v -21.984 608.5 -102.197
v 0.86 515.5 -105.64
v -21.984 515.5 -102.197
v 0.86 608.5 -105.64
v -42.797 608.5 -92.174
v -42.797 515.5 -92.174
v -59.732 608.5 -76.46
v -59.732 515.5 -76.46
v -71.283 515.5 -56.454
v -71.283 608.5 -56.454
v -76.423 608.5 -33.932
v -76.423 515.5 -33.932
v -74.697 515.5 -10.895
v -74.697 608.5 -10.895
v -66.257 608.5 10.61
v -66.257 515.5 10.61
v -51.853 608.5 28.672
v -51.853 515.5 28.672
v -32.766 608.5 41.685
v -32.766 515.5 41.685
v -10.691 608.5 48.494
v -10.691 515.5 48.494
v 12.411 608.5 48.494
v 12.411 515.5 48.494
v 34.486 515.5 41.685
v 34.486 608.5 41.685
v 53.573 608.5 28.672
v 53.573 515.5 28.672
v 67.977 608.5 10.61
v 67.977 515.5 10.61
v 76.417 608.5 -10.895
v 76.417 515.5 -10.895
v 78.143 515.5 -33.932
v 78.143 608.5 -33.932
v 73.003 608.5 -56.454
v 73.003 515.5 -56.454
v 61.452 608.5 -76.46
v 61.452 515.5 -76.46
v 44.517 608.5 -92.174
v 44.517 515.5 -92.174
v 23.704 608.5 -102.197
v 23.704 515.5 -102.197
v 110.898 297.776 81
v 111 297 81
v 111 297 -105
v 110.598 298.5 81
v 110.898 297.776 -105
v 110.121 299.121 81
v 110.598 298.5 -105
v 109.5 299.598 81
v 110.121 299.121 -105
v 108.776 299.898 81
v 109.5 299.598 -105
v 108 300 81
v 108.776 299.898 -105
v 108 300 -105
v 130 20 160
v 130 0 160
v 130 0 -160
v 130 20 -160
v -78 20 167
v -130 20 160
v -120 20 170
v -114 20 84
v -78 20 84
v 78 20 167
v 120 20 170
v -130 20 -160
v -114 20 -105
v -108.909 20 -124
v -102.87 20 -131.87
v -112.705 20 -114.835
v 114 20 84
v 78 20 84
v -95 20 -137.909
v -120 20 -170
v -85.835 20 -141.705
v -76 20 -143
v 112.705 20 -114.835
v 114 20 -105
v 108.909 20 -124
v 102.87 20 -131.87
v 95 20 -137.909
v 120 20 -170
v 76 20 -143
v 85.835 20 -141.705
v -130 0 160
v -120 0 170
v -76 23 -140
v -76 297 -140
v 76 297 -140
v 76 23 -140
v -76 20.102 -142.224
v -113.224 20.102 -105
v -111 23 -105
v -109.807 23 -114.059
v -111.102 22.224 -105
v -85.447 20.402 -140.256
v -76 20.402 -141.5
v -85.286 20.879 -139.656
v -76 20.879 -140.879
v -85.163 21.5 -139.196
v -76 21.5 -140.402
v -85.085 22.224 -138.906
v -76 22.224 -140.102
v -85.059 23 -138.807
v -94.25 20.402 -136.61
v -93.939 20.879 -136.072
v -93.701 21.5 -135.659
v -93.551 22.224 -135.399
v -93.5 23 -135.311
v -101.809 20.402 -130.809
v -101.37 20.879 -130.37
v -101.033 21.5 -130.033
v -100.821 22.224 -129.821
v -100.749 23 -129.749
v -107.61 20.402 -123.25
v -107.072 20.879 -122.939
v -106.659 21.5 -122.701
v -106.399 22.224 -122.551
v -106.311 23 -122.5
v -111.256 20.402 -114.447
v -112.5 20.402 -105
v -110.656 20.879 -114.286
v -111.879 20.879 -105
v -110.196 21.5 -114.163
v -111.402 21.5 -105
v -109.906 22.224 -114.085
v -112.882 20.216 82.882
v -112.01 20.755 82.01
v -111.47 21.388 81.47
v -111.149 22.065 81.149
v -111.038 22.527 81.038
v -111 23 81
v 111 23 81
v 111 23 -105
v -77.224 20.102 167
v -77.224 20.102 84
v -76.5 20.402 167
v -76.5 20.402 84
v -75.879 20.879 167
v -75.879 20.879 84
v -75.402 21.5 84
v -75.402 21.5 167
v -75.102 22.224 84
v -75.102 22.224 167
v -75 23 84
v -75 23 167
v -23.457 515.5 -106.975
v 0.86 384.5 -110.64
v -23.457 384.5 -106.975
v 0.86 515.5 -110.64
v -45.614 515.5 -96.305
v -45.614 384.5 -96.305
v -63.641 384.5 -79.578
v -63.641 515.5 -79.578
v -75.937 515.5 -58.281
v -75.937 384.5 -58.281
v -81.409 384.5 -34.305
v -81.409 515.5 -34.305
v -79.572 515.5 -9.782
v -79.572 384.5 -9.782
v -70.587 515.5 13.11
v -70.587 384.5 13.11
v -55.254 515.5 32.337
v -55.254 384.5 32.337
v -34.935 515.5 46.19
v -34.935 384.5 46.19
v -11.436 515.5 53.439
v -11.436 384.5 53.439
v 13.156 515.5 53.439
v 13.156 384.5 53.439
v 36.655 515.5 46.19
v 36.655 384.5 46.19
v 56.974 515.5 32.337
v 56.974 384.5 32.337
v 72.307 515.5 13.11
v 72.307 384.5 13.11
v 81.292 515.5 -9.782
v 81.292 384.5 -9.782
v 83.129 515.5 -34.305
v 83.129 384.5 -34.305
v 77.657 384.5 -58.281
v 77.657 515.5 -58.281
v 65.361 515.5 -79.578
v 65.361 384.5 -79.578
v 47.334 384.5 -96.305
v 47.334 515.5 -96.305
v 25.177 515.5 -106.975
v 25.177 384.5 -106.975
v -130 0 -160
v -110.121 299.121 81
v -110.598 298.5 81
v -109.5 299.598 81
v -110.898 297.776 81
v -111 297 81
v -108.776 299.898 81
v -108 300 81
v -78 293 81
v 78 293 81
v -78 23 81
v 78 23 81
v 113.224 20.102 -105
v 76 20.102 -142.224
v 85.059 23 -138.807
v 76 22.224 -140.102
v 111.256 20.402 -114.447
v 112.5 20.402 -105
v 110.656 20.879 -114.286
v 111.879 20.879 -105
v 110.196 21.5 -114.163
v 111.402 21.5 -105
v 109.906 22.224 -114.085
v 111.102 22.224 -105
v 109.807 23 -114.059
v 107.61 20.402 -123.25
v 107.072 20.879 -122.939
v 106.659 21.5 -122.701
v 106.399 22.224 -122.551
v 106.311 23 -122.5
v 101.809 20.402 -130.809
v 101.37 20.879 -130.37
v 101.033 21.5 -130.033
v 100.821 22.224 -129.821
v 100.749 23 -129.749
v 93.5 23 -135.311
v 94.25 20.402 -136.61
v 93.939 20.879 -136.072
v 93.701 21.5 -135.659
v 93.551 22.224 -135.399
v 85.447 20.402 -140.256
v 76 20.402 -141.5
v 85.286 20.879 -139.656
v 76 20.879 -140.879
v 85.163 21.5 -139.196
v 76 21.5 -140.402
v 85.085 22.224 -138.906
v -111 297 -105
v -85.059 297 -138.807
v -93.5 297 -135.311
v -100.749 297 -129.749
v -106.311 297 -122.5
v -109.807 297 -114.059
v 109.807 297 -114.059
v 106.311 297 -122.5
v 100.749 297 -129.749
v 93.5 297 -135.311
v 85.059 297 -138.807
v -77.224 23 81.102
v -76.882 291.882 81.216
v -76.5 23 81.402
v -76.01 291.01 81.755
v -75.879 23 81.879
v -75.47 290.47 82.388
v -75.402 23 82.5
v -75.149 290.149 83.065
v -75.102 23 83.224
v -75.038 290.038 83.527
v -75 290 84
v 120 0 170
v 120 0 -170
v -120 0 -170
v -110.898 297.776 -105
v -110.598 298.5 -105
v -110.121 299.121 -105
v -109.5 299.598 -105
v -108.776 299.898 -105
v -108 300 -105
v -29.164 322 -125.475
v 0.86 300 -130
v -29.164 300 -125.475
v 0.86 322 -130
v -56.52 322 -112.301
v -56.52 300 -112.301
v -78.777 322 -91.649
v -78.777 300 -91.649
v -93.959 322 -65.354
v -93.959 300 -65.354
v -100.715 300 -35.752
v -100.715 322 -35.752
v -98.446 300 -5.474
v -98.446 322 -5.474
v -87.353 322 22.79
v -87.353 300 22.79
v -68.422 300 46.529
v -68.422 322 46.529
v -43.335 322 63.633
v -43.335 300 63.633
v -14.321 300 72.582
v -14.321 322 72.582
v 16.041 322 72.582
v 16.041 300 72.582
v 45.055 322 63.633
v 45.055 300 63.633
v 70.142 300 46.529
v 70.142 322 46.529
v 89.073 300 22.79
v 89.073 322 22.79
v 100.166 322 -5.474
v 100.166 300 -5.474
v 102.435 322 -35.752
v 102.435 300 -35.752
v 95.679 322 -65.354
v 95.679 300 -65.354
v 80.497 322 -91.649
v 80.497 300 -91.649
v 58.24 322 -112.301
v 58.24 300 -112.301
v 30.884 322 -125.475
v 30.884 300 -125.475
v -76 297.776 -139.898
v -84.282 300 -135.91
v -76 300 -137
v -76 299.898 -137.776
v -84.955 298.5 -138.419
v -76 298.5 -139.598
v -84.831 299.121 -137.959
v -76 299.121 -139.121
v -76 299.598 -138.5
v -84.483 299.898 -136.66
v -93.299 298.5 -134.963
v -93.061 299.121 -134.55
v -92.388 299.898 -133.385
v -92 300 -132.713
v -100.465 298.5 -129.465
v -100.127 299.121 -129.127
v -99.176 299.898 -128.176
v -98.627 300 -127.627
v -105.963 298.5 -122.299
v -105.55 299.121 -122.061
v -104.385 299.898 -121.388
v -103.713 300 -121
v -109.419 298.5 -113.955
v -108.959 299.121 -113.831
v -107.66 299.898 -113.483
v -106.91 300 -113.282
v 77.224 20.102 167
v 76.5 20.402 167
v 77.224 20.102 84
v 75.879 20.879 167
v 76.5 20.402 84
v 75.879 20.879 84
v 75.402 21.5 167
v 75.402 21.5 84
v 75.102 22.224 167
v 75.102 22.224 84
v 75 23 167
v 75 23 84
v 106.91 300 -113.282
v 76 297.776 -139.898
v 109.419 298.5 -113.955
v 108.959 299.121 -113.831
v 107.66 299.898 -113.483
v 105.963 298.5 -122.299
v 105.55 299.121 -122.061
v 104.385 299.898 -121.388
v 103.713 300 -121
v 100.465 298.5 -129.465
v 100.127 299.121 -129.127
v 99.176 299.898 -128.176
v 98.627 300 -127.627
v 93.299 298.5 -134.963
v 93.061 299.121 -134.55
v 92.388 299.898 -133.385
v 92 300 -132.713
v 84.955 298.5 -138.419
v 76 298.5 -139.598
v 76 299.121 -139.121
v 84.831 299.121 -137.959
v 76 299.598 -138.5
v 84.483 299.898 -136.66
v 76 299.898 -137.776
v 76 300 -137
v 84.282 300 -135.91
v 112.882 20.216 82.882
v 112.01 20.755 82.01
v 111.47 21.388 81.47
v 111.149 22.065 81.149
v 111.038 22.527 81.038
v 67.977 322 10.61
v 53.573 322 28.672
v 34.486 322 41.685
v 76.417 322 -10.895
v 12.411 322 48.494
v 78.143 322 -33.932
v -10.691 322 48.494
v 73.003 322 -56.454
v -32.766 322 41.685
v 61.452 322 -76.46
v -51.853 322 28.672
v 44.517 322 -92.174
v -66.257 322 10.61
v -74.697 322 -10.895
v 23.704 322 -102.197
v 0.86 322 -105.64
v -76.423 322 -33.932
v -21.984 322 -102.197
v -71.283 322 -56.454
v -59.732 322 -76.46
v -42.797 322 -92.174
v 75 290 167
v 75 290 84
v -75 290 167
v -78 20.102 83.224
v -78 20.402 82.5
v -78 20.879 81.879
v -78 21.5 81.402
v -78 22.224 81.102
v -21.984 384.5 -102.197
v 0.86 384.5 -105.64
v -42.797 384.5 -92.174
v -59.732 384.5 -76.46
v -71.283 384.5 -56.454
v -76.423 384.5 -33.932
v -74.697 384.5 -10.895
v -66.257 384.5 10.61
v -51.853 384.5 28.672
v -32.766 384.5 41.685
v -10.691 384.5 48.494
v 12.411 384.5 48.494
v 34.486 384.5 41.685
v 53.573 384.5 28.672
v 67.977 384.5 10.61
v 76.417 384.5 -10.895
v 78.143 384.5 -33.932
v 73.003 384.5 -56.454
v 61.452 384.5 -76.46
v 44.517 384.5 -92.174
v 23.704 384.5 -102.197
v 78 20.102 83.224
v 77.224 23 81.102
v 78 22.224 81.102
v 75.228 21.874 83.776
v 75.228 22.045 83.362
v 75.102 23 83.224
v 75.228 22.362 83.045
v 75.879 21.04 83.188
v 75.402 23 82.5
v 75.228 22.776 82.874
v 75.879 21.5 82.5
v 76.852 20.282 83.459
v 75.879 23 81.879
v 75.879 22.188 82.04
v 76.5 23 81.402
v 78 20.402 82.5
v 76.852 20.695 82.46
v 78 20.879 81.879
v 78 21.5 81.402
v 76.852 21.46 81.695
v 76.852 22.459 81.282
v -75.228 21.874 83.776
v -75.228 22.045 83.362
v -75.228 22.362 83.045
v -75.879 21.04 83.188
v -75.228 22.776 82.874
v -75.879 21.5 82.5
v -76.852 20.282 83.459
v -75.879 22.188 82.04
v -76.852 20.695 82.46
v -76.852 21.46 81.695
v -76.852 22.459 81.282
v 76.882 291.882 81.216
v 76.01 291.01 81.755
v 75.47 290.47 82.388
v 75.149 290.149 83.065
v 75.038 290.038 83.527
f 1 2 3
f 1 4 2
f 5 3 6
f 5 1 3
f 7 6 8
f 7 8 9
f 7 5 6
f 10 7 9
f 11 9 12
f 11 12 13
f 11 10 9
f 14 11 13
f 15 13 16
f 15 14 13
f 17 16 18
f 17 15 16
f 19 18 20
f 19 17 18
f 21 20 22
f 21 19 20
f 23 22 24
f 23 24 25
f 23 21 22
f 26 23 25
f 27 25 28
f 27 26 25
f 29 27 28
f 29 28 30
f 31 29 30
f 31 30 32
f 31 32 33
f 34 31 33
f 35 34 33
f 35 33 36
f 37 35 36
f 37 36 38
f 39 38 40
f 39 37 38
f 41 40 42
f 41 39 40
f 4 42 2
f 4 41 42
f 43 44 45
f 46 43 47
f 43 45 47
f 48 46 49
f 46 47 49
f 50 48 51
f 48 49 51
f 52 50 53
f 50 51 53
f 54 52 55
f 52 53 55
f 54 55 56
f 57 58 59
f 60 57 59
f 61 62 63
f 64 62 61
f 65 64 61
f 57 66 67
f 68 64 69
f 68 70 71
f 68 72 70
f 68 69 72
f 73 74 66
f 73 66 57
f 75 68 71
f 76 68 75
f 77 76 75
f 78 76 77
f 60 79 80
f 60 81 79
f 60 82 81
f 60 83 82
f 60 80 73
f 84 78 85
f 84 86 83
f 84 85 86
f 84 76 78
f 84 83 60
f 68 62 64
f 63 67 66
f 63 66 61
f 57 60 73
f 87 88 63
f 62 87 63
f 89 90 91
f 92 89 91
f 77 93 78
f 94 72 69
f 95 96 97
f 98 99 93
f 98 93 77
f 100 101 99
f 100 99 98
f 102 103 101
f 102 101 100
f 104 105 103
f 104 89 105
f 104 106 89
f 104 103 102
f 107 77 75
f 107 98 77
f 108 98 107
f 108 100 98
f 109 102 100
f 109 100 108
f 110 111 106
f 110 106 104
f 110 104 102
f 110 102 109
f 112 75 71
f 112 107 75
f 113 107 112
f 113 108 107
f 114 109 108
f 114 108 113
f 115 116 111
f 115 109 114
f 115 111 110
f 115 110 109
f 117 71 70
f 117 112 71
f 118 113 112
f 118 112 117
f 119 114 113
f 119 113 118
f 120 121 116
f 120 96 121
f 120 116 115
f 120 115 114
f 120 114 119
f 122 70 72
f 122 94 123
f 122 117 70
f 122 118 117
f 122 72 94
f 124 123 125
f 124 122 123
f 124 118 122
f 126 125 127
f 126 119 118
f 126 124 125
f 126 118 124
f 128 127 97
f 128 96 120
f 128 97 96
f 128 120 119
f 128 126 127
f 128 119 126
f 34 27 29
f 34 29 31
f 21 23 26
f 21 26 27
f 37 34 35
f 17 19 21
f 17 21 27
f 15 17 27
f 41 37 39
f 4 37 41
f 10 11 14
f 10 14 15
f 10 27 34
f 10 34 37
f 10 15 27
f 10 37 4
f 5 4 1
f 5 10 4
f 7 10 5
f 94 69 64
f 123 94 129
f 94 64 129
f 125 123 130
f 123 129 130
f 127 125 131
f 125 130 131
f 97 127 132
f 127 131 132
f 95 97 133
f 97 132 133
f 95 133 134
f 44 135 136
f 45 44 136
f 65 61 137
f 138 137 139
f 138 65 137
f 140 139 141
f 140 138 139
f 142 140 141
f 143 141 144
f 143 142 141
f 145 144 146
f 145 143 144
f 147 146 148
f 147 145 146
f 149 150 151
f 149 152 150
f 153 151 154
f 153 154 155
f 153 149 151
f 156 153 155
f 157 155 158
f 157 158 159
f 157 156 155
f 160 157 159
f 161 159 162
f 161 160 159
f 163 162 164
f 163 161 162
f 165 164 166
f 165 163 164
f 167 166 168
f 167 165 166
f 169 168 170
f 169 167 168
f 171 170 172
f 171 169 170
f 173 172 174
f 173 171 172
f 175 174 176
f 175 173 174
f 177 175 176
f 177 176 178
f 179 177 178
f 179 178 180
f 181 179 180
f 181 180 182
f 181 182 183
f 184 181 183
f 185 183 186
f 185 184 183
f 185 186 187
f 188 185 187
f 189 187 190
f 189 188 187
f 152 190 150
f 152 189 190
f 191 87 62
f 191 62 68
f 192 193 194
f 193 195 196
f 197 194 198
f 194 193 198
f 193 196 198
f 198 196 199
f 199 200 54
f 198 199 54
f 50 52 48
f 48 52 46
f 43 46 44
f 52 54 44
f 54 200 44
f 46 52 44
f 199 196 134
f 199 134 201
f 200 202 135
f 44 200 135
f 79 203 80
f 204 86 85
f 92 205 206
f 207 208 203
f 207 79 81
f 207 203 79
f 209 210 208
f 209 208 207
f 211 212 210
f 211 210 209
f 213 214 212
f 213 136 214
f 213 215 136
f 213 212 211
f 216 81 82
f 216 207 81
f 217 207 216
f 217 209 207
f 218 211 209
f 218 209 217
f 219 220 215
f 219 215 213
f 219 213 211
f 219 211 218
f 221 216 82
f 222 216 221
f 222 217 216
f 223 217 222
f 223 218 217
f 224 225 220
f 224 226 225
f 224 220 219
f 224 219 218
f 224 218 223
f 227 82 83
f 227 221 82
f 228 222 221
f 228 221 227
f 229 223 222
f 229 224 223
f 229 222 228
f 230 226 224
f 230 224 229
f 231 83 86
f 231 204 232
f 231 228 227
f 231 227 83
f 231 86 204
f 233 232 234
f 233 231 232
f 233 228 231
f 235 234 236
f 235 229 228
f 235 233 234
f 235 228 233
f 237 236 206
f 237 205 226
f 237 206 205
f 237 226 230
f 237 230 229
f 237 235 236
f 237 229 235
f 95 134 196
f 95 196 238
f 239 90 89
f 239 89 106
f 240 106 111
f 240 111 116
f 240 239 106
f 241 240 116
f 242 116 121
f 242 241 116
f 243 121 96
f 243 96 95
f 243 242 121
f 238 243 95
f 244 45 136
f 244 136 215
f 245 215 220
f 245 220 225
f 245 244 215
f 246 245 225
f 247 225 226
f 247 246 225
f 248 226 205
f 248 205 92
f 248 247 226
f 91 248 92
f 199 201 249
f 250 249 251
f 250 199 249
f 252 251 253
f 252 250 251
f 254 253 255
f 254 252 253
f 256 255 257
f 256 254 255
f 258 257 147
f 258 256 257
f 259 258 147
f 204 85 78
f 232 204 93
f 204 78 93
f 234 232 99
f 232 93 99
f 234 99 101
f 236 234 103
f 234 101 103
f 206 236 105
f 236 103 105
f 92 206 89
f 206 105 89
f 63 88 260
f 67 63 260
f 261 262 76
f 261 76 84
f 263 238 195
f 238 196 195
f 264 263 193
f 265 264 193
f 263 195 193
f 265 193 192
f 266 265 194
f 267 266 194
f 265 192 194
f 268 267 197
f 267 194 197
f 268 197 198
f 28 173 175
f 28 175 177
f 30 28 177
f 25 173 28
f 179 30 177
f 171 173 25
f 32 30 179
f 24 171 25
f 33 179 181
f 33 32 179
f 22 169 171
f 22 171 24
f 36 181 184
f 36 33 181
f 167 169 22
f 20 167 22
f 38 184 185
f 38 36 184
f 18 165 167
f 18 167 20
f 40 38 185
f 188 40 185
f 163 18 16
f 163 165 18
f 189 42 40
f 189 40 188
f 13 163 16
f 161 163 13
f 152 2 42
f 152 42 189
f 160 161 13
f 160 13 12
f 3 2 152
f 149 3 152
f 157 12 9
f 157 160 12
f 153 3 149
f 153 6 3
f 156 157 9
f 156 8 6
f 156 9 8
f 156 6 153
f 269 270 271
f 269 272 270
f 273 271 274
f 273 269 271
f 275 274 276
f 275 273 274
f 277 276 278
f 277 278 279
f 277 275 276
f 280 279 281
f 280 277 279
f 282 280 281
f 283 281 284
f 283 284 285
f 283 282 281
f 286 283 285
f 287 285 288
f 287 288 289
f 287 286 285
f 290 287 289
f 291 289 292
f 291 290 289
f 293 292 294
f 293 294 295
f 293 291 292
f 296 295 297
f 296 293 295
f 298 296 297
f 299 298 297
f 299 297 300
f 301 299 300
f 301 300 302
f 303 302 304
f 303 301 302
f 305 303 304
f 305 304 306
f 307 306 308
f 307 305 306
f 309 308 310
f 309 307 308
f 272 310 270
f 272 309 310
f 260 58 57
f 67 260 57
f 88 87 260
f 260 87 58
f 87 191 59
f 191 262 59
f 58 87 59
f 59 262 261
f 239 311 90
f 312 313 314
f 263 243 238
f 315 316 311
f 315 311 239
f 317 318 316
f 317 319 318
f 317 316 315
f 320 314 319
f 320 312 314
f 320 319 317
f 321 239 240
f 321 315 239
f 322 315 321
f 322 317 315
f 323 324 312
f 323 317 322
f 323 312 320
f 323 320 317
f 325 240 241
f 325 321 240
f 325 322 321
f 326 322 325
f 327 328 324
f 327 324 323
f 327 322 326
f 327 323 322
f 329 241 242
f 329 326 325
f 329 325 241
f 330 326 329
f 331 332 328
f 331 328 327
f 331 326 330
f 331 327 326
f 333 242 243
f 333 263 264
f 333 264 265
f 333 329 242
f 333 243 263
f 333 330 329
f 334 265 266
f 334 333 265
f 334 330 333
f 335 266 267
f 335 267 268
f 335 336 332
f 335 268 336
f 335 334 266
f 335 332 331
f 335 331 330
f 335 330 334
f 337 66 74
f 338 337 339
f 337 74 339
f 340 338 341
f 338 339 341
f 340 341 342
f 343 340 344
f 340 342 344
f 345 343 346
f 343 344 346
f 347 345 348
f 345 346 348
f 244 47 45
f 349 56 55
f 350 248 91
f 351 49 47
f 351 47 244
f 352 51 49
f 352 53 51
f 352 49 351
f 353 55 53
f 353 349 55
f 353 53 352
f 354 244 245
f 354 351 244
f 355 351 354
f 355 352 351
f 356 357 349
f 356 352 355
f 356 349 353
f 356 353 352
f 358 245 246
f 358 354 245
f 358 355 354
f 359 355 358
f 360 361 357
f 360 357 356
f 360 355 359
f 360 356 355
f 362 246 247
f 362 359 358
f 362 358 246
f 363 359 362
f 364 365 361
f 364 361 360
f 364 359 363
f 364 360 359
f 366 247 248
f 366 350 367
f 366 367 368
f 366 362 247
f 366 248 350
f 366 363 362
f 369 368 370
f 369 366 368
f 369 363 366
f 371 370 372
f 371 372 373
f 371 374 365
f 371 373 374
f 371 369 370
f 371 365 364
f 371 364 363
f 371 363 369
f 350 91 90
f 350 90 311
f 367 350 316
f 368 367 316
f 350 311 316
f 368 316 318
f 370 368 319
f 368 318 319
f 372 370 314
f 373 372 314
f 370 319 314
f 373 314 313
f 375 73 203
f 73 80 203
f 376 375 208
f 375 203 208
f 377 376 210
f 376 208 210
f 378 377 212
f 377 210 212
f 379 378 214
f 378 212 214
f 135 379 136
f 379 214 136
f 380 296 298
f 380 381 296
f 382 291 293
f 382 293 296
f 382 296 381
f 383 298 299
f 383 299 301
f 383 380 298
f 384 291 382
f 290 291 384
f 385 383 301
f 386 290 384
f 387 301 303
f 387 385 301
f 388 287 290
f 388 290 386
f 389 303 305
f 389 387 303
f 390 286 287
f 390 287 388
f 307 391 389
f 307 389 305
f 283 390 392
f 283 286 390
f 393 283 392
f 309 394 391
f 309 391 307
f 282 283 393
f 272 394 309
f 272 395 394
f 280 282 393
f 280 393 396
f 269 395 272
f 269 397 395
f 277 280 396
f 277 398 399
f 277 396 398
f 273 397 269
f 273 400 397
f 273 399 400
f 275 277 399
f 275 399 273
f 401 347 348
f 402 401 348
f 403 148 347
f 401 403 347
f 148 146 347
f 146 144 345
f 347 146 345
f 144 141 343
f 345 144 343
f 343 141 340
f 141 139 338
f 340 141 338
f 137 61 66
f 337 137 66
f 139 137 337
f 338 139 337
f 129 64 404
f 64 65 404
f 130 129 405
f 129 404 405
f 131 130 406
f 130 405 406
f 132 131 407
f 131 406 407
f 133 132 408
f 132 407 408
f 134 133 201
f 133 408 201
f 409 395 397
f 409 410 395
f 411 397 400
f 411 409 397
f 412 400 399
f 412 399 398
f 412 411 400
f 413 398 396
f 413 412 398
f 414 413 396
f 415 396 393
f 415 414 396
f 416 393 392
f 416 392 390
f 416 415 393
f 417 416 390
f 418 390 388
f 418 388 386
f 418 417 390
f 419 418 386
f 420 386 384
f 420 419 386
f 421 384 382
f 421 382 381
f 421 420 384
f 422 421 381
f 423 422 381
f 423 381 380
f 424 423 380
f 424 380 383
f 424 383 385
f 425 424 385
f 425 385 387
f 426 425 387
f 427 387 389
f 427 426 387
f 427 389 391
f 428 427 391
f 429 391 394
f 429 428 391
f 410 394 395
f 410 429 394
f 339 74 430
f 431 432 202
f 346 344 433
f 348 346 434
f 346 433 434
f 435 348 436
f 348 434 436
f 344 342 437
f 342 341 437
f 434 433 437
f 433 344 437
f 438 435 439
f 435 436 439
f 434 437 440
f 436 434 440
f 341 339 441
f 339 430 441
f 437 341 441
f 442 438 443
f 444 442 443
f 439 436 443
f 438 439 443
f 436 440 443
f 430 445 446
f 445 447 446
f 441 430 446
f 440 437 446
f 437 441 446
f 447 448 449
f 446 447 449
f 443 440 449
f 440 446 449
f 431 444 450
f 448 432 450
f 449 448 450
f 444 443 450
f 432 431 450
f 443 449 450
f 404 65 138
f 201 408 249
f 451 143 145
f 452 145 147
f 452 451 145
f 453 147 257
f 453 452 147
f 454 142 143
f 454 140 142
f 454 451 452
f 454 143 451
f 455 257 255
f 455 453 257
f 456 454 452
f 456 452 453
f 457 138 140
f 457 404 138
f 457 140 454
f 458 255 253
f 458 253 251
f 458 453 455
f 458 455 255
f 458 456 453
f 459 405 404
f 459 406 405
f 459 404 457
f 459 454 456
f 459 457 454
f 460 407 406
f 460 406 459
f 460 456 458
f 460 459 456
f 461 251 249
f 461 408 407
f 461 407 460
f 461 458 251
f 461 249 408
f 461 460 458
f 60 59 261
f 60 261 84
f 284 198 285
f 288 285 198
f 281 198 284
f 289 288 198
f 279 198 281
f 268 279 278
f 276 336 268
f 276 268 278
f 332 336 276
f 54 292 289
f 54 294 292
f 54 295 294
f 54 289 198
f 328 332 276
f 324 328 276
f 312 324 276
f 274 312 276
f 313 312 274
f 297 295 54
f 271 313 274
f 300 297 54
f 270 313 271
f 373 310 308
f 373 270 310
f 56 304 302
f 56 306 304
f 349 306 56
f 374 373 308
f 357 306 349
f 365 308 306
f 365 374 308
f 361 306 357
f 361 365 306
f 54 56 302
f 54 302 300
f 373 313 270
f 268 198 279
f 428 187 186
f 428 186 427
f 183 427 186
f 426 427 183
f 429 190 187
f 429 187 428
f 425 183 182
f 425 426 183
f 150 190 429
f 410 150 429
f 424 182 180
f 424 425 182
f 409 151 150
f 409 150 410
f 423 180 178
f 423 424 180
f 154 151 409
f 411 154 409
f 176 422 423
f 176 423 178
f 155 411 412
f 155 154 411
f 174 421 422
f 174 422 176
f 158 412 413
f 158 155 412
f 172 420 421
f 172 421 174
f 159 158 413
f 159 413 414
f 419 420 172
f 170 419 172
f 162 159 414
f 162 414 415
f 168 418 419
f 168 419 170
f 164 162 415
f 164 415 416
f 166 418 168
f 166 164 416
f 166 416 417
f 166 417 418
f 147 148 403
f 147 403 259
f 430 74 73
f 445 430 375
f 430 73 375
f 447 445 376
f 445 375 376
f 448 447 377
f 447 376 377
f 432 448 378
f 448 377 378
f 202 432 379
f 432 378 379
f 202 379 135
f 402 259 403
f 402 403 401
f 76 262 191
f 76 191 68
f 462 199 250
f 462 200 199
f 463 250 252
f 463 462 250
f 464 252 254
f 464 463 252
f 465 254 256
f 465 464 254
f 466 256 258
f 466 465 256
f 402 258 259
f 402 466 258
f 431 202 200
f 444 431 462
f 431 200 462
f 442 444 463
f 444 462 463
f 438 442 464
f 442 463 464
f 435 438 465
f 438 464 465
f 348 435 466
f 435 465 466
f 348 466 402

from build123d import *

# Parameters (mm, degrees)
CROQUIS1_W              = 260
CROQUIS1_H              = 340
SALIENTE_EXTRUIR1_DEPTH = 20
CROQUIS2_W              = 222
CROQUIS2_H              = 221
SALIENTE_EXTRUIR2_DEPTH = 280
CROQUIS3_W              = 150
CROQUIS3_H              = 86
SALIENTE_EXTRUIR3_DEPTH = 270
CHAFL_N1_SIZE           = 10
REDONDEO1_R             = 35
REDONDEO3_R             = 3


with BuildPart() as part:
    # Croquis1 → Saliente-Extruir1 (new body)
    with BuildSketch(Plane(origin=(0, 0, 0), x_dir=(1, 0, 0), z_dir=(0, 1, 0))):
        Rectangle(CROQUIS1_W, CROQUIS1_H)
    extrude(amount=SALIENTE_EXTRUIR1_DEPTH)

    # Croquis2 → Saliente-Extruir2 (add)
    with BuildSketch(Plane(origin=(0, 20, 0), x_dir=(1, 0, 0), z_dir=(0, 1, 0))):
        with Locations((0, 29.5)):
            Rectangle(CROQUIS2_W, CROQUIS2_H)
    extrude(amount=SALIENTE_EXTRUIR2_DEPTH)

    # Croquis3 → Saliente-Extruir3 (add)
    with BuildSketch(Plane(origin=(0, 20, 0), x_dir=(1, 0, 0), z_dir=(0, 1, 0))):
        with Locations((0, -124)):
            Rectangle(CROQUIS3_W, CROQUIS3_H)
    extrude(amount=SALIENTE_EXTRUIR3_DEPTH)

    # Chaflán1
    chafl_n1_edges = [part.edges().sort_by_distance(p)[0] for p in [
        (130, 10, 170),
        (-130, 10, 170),
        (-130, 10, -170),
        (130, 10, -170),
    ]]
    chamfer(chafl_n1_edges, length=CHAFL_N1_SIZE)

    # Redondeo1
    redondeo1_edges = [part.edges().sort_by_distance(p)[0] for p in [
        (-111, 160, -140),
        (111, 160, -140),
    ]]
    fillet(redondeo1_edges, radius=REDONDEO1_R)

    # Redondeo3
    redondeo3_edges = [part.edges().sort_by_distance(p)[0] for p in [
        (-93, 20, 81),
        (111, 20, -12),
        (111, 300, -12),
        (93, 20, 81),
        (-75, 20, 124),
        (-75, 155, 81),
        (75, 20, 124),
        (75, 155, 81),
        (0, 290, 81),
        (0, 20, -140),
        (0, 300, -140),
        (-111, 300, -12),
        (-100.748737342, 300, -129.748737342),
        (100.748737342, 300, -129.748737342),
        (-111, 20, -12),
        (100.748737342, 20, -129.748737342),
        (-100.748737342, 20, -129.748737342),
    ]]
    fillet(redondeo3_edges, radius=REDONDEO3_R)

    # Croquis4 → Revolución1 (revolve)
    with BuildSketch(Plane.ZY.offset(-0.86)):
        Polygon((-28.14, 300), (-130, 300), (-130, 322), (-105.64, 322), (-105.64, 384.5), (-110.64, 384.5), (-110.64, 515.5), (-105.64, 515.5), (-105.64, 608.5), (-28.14, 608.5), align=None)
    revolve(axis=Axis((0.86, 300, -28.14), (0, 1, 0)))


solid = part.part
